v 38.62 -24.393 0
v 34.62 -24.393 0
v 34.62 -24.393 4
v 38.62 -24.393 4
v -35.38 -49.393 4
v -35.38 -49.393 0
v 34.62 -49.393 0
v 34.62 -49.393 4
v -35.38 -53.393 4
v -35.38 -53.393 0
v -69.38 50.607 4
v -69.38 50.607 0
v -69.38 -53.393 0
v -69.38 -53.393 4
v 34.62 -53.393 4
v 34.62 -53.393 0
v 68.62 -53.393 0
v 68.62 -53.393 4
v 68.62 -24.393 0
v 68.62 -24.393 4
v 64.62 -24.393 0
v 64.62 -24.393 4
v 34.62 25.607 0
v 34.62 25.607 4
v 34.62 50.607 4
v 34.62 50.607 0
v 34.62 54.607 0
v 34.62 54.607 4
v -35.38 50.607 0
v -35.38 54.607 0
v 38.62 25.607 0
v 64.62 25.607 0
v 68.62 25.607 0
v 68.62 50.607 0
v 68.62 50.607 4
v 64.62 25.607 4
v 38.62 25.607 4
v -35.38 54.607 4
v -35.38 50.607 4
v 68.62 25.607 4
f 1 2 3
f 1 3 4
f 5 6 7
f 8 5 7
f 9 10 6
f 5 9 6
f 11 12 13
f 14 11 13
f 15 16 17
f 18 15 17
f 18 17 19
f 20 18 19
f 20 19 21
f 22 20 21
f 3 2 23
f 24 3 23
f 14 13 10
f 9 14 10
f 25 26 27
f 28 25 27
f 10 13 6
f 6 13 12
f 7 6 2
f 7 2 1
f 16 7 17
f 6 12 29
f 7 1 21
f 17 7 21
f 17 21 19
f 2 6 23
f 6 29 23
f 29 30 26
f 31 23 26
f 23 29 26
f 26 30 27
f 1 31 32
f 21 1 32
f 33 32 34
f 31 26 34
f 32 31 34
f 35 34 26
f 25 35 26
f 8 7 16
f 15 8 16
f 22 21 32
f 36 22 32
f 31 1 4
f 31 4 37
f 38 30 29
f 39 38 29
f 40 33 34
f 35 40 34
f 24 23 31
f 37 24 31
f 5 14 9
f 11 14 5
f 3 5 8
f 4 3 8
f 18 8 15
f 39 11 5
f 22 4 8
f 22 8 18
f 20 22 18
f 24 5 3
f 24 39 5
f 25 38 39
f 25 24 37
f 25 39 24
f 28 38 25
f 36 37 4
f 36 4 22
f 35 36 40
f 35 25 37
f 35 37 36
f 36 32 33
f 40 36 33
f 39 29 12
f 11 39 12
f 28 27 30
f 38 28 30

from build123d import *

# Parameters (mm, degrees)
SKETCH_1_W      = 4
SKETCH_1_H      = 50
EXTRUDE_1_DEPTH = 4


with BuildPart() as part:
    # Эскиз1 → Бобышка-Вытянуть1 (new body)
    with BuildSketch(Plane.XY):
        Polygon((-35.380363478, 50.607363696), (-65.380363478, 50.607363696), (-69.380363478, 50.607363696), (-69.380363478, -53.392636304), (-65.380363478, -53.392636304), (-35.380363478, -53.392636304), (-35.380363478, -49.392636304), (34.619636522, -49.392636304), (34.619636522, -53.392636304), (64.619636522, -53.392636304), (68.619636522, -53.392636304), (68.619636522, -24.392636304), (64.619636522, -24.392636304), (64.619636522, 25.607363696), (68.619636522, 25.607363696), (68.619636522, 50.607363696), (64.619636522, 50.607363696), (34.619636522, 50.607363696), (34.619636522, 54.607363696), (-35.380363478, 54.607363696), align=None)
        with Locations((36.619636522, 0.607363696)):
            Rectangle(SKETCH_1_W, SKETCH_1_H, mode=Mode.SUBTRACT)
    extrude(amount=EXTRUDE_1_DEPTH)


solid = part.part
